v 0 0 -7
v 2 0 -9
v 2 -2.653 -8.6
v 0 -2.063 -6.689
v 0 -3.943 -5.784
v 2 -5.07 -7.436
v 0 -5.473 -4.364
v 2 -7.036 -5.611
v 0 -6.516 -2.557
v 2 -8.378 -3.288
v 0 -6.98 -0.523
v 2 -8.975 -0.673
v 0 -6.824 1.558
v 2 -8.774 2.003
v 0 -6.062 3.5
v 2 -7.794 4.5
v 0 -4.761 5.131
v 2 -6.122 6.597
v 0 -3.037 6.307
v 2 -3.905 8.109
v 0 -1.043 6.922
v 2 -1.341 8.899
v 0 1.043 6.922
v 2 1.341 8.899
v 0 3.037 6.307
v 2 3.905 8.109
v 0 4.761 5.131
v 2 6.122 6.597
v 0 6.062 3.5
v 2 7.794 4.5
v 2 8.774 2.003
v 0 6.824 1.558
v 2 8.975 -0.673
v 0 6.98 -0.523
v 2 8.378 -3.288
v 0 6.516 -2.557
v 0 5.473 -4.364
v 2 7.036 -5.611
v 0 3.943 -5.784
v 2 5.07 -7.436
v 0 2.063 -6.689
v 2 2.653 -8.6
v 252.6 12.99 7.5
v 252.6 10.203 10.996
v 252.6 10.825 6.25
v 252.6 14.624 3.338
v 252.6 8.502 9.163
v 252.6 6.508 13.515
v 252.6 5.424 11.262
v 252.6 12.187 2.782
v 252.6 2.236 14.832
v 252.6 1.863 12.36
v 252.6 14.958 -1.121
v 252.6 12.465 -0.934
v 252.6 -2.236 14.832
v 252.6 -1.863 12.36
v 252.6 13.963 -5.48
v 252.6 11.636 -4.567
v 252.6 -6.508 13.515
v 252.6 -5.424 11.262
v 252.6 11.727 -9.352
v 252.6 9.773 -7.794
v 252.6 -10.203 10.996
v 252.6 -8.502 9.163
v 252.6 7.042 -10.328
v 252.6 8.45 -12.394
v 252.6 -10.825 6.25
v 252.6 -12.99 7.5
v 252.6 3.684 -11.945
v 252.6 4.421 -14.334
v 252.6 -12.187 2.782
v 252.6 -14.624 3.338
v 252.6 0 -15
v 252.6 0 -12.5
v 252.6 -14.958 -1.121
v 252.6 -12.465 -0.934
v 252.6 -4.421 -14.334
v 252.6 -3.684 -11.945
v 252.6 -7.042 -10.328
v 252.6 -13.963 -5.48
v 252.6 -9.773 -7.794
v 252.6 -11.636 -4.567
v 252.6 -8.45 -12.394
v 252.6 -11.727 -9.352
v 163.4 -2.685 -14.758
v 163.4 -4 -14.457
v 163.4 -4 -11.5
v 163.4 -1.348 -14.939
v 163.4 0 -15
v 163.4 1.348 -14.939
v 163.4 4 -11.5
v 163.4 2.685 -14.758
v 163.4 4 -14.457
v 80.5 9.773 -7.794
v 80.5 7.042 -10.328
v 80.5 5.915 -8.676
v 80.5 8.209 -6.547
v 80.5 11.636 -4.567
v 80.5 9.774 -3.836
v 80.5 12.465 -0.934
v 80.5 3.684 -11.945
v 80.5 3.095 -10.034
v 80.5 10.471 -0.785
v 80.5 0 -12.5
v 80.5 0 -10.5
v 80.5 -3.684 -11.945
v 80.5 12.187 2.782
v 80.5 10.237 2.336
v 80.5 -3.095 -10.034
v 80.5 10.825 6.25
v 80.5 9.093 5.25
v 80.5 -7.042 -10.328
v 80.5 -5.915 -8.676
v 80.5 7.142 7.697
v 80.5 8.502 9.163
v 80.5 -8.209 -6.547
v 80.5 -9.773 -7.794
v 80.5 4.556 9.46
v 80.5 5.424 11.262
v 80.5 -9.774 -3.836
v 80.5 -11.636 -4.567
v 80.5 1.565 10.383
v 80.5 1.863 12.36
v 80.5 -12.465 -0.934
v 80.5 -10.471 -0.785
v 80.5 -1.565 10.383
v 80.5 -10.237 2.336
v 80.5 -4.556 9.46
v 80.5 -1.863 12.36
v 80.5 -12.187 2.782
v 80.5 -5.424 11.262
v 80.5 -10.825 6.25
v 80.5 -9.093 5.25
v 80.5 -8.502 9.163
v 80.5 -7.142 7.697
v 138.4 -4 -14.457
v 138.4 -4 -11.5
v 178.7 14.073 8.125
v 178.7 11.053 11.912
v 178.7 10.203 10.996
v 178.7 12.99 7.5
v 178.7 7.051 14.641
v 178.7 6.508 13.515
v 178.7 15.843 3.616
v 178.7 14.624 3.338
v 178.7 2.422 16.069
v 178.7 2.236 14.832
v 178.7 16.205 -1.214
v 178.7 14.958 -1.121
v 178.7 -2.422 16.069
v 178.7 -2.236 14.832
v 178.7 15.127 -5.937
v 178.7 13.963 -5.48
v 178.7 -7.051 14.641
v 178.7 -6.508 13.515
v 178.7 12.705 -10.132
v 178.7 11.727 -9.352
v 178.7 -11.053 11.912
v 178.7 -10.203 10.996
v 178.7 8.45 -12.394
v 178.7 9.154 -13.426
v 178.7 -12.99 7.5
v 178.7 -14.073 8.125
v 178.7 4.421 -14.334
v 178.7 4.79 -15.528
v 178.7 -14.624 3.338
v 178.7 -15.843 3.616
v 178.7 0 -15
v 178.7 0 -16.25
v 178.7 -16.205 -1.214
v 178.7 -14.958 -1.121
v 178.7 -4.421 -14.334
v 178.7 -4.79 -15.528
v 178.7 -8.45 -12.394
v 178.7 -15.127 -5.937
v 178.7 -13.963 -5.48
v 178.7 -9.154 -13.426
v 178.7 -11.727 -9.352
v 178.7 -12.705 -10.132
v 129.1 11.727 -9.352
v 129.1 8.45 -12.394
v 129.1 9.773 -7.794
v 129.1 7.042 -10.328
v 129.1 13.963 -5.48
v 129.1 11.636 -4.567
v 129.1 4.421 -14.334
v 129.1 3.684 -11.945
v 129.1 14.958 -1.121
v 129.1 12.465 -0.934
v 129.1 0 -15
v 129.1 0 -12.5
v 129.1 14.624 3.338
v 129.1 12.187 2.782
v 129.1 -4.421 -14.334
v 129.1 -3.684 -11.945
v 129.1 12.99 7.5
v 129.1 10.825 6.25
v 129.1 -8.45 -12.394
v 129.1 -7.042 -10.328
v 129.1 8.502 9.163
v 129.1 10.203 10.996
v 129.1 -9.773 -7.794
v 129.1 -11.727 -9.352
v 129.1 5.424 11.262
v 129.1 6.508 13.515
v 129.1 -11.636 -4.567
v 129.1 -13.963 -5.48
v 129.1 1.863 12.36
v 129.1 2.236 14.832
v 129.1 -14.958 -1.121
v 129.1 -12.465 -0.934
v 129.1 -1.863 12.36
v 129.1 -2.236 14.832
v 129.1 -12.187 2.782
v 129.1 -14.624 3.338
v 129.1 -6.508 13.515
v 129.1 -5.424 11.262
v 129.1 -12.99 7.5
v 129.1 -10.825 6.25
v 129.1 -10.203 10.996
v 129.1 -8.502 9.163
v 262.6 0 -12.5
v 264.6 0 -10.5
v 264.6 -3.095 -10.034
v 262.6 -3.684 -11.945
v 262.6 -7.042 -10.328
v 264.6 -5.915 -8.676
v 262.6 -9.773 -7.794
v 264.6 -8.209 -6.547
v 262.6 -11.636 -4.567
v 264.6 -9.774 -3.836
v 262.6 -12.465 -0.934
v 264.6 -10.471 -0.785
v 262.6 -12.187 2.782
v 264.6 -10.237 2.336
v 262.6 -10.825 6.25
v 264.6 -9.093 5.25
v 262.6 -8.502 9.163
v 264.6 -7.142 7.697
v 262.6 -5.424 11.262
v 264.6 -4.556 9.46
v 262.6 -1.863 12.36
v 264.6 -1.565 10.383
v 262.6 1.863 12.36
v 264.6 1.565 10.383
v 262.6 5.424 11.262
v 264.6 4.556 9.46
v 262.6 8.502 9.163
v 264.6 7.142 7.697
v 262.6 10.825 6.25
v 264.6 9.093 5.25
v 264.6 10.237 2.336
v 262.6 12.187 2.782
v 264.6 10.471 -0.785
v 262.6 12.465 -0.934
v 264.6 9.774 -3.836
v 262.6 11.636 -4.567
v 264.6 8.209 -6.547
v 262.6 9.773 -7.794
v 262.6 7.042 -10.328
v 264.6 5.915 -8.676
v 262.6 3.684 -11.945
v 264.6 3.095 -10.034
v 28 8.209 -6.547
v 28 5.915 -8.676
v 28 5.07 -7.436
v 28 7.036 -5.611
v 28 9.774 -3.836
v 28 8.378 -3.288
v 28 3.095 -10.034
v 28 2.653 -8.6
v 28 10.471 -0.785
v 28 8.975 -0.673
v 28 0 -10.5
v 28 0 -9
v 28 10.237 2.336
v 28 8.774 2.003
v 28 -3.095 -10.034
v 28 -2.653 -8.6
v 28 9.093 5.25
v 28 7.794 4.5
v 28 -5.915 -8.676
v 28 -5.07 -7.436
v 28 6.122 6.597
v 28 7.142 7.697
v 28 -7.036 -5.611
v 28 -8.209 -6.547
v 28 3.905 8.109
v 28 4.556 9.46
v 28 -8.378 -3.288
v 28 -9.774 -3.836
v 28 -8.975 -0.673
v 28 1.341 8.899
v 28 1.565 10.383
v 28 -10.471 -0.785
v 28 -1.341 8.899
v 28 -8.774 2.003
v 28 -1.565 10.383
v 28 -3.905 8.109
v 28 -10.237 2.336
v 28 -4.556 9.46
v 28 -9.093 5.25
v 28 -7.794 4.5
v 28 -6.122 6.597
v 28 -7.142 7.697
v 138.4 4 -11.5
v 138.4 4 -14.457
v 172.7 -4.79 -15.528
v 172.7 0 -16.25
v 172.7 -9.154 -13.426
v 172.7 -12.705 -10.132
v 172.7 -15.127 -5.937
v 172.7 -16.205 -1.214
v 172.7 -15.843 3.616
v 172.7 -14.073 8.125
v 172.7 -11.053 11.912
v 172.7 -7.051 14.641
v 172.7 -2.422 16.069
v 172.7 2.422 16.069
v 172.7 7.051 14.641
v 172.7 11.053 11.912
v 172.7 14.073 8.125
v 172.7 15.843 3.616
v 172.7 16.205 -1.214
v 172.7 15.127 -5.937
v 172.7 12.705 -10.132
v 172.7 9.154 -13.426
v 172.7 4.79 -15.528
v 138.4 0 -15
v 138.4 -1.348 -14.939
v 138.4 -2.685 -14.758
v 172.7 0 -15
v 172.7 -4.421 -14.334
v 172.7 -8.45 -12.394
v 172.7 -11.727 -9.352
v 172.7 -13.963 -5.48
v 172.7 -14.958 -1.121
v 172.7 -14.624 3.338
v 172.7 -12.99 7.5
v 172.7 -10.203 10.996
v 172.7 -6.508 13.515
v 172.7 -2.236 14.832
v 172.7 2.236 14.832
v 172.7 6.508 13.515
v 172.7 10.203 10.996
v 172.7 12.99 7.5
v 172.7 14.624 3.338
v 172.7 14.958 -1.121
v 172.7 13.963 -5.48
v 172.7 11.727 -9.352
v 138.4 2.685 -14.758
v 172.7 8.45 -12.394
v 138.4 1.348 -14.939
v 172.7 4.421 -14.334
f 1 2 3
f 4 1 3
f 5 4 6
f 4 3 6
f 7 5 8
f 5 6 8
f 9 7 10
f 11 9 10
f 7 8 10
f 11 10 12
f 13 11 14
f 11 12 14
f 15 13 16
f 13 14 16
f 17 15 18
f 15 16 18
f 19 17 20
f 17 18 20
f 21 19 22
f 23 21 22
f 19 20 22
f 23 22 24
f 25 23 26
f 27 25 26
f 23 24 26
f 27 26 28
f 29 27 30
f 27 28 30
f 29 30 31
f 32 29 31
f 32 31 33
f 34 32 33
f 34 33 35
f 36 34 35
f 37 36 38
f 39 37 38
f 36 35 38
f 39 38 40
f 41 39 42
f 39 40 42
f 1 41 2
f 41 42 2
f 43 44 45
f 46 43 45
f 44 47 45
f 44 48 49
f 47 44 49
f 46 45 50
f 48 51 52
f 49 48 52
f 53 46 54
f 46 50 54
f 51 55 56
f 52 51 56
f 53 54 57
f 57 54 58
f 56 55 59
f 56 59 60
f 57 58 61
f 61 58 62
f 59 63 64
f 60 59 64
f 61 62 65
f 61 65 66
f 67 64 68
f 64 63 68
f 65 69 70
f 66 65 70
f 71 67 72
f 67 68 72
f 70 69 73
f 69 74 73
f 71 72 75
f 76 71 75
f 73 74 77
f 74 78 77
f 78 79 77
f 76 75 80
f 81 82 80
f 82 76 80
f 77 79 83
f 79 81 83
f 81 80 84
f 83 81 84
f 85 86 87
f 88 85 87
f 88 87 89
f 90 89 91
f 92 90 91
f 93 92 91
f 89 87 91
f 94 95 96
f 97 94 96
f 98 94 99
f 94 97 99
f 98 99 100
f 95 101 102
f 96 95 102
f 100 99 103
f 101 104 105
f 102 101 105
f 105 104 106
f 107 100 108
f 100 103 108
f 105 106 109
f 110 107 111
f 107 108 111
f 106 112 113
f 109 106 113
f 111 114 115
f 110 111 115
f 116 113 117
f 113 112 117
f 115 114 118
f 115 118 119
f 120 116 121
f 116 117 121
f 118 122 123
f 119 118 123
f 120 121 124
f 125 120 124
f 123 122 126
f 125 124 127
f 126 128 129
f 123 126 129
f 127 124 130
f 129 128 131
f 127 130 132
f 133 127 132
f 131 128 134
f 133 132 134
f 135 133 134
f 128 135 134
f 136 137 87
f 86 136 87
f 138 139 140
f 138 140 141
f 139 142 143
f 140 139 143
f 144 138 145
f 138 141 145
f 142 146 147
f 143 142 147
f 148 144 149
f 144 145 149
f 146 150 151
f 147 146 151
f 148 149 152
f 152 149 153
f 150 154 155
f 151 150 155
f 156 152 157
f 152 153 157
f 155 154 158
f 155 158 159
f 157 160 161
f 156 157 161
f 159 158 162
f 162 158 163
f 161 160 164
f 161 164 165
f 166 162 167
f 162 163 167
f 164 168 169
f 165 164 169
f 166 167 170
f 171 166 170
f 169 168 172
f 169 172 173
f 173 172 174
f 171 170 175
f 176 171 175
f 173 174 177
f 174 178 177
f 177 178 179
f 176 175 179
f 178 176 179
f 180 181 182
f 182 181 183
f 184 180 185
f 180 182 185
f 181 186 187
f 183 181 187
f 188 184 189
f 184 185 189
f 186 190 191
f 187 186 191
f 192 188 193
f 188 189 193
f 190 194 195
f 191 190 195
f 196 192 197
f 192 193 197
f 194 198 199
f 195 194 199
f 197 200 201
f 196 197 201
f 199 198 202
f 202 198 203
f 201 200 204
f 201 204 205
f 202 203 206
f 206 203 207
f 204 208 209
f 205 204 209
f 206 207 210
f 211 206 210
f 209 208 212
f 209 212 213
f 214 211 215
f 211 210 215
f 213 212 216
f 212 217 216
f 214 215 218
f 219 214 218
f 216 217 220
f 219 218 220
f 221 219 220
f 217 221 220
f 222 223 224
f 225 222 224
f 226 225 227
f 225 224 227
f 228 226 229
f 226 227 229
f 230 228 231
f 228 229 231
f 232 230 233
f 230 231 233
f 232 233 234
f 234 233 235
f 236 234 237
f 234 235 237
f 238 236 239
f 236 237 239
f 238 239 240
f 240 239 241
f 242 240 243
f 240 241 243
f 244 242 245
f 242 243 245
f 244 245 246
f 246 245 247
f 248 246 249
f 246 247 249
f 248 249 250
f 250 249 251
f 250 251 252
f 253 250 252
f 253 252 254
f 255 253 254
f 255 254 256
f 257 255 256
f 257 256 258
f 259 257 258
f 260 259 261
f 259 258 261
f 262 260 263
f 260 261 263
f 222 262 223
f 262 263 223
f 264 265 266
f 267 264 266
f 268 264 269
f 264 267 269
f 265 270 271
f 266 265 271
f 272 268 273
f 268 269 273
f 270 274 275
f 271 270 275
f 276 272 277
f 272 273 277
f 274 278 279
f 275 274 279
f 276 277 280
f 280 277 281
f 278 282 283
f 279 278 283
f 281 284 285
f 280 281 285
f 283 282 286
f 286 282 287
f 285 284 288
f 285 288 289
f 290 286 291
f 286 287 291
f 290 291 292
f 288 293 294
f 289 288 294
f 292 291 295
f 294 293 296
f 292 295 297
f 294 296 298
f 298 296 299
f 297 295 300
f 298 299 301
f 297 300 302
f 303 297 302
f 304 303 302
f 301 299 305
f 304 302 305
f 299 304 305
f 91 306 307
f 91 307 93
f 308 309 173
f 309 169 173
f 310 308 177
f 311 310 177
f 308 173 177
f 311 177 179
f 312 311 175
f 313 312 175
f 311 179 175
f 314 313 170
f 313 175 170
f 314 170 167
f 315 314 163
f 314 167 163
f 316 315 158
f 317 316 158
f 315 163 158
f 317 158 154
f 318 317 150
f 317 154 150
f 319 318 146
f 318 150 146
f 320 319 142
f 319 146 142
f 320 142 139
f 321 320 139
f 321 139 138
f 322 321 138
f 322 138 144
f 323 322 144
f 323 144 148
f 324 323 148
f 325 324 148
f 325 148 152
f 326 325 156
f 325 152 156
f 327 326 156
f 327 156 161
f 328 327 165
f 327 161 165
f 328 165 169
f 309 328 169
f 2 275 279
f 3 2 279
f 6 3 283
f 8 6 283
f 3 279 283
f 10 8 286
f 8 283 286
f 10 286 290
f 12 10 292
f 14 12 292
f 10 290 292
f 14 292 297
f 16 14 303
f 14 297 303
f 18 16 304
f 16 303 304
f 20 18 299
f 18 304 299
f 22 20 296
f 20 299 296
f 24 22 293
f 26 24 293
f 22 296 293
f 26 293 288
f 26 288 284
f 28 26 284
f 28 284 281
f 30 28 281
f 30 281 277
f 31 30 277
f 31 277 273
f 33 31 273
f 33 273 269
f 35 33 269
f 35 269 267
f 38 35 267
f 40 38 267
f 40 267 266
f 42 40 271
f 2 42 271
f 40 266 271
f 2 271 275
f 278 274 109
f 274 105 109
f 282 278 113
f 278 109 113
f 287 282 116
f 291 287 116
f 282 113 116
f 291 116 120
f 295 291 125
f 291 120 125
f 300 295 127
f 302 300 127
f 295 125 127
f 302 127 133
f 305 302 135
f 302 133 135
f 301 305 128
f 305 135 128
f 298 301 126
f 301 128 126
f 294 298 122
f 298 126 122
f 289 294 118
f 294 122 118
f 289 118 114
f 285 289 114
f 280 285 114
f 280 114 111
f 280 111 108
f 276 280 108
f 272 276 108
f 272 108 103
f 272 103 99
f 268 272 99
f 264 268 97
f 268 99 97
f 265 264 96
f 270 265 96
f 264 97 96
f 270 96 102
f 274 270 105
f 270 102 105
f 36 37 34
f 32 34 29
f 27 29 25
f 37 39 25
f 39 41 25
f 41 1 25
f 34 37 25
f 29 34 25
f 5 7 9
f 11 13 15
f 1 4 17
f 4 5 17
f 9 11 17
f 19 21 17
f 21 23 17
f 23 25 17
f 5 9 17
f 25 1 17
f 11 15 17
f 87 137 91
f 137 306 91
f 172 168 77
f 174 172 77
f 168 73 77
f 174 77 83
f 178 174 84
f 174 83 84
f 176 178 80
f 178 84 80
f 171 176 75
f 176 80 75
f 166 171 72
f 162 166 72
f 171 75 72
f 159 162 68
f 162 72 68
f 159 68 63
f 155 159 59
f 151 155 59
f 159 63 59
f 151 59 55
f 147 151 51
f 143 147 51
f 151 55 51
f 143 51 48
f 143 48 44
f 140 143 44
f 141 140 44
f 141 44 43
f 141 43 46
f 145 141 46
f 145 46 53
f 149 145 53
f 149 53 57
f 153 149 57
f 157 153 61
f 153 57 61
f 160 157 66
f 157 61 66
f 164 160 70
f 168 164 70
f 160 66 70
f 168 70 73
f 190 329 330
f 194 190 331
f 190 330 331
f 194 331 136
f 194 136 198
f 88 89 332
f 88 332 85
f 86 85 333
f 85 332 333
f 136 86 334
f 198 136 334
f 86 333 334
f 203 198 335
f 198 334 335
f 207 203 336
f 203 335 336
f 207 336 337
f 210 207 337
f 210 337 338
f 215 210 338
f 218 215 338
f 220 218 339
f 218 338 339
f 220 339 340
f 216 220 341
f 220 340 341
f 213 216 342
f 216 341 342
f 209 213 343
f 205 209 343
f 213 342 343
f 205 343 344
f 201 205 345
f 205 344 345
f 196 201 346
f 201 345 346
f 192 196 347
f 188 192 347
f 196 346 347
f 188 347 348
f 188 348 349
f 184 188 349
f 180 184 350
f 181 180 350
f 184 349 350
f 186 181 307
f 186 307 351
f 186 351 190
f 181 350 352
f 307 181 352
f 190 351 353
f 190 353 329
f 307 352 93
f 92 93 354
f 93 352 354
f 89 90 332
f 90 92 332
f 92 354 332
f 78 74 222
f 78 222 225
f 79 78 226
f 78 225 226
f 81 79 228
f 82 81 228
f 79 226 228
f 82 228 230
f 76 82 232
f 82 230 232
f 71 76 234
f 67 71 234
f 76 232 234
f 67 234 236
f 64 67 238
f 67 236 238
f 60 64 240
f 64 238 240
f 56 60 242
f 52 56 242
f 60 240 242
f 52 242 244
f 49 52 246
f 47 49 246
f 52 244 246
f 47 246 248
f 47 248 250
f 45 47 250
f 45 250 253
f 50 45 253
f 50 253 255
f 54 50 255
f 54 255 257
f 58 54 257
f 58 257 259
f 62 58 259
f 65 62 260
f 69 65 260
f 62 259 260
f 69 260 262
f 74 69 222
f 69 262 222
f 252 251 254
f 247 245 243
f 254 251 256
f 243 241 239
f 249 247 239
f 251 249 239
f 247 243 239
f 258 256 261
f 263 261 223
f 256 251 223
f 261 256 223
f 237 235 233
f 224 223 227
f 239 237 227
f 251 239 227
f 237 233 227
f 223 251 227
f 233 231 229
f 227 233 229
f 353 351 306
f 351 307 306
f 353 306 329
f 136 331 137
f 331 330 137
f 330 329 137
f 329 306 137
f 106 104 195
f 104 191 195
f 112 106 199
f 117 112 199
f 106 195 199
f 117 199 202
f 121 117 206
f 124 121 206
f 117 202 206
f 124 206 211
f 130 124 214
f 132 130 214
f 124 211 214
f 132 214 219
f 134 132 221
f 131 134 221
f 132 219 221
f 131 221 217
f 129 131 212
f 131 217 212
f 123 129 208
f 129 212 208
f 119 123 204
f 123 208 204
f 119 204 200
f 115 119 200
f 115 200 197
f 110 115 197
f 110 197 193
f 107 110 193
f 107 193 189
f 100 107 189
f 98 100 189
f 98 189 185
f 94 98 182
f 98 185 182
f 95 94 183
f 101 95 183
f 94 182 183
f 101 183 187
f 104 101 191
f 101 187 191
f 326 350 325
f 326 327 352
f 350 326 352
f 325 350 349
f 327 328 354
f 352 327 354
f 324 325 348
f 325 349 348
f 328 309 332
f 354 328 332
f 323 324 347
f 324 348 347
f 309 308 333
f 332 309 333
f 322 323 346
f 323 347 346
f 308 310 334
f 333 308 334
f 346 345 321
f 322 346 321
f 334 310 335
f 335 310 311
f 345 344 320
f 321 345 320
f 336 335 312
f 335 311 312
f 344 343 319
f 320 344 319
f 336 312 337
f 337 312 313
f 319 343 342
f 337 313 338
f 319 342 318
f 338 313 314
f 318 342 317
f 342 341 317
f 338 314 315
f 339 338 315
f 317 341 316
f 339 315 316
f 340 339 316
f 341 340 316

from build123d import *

# Parameters (mm, degrees)
CHAMFER_1_SIZE      = 2
CUT_EXTRUDE_START   = -11.5
SKETCH_2_W          = 25
SKETCH_2_H          = 4
CUT_EXTRUDE_1_DEPTH = 28


with BuildPart() as part:
    # 草图1 → 旋转1 (revolve)
    with BuildSketch(Plane.XY, mode=Mode.PRIVATE) as revolve_1_sk:
        Polygon((0, 0), (0, 9), (28, 9), (28, 10.5), (80.5, 10.5), (80.5, 12.5), (129.1, 12.5), (129.1, 15), (172.7, 15), (172.7, 16.25), (178.7, 16.25), (178.7, 15), (252.6, 15), (252.6, 12.5), (264.6, 12.5), (264.6, 0), align=None)
    revolve(revolve_1_sk.sketch.rotate(Axis((264.6, 0, 0), (-1, 0, 0)), 90), axis=Axis((264.6, 0, 0), (-1, 0, 0)))

    # 倒角1
    chamfer_1_edges = [part.edges().sort_by_distance(p)[0] for p in [
        (264.6, 0, 12.5),
        (0, 0, 9),
    ]]
    chamfer(chamfer_1_edges, length=CHAMFER_1_SIZE)

    # 草图2 → 切除-拉伸1 (cut)
    with BuildSketch(Plane.XY.offset(CUT_EXTRUDE_START)):
        with Locations((150.9, -2)):
            Rectangle(SKETCH_2_W, SKETCH_2_H)
        with Locations((150.9, 2)):
            Rectangle(SKETCH_2_W, SKETCH_2_H)
    extrude(amount=-CUT_EXTRUDE_1_DEPTH, mode=Mode.SUBTRACT)


solid = part.part
